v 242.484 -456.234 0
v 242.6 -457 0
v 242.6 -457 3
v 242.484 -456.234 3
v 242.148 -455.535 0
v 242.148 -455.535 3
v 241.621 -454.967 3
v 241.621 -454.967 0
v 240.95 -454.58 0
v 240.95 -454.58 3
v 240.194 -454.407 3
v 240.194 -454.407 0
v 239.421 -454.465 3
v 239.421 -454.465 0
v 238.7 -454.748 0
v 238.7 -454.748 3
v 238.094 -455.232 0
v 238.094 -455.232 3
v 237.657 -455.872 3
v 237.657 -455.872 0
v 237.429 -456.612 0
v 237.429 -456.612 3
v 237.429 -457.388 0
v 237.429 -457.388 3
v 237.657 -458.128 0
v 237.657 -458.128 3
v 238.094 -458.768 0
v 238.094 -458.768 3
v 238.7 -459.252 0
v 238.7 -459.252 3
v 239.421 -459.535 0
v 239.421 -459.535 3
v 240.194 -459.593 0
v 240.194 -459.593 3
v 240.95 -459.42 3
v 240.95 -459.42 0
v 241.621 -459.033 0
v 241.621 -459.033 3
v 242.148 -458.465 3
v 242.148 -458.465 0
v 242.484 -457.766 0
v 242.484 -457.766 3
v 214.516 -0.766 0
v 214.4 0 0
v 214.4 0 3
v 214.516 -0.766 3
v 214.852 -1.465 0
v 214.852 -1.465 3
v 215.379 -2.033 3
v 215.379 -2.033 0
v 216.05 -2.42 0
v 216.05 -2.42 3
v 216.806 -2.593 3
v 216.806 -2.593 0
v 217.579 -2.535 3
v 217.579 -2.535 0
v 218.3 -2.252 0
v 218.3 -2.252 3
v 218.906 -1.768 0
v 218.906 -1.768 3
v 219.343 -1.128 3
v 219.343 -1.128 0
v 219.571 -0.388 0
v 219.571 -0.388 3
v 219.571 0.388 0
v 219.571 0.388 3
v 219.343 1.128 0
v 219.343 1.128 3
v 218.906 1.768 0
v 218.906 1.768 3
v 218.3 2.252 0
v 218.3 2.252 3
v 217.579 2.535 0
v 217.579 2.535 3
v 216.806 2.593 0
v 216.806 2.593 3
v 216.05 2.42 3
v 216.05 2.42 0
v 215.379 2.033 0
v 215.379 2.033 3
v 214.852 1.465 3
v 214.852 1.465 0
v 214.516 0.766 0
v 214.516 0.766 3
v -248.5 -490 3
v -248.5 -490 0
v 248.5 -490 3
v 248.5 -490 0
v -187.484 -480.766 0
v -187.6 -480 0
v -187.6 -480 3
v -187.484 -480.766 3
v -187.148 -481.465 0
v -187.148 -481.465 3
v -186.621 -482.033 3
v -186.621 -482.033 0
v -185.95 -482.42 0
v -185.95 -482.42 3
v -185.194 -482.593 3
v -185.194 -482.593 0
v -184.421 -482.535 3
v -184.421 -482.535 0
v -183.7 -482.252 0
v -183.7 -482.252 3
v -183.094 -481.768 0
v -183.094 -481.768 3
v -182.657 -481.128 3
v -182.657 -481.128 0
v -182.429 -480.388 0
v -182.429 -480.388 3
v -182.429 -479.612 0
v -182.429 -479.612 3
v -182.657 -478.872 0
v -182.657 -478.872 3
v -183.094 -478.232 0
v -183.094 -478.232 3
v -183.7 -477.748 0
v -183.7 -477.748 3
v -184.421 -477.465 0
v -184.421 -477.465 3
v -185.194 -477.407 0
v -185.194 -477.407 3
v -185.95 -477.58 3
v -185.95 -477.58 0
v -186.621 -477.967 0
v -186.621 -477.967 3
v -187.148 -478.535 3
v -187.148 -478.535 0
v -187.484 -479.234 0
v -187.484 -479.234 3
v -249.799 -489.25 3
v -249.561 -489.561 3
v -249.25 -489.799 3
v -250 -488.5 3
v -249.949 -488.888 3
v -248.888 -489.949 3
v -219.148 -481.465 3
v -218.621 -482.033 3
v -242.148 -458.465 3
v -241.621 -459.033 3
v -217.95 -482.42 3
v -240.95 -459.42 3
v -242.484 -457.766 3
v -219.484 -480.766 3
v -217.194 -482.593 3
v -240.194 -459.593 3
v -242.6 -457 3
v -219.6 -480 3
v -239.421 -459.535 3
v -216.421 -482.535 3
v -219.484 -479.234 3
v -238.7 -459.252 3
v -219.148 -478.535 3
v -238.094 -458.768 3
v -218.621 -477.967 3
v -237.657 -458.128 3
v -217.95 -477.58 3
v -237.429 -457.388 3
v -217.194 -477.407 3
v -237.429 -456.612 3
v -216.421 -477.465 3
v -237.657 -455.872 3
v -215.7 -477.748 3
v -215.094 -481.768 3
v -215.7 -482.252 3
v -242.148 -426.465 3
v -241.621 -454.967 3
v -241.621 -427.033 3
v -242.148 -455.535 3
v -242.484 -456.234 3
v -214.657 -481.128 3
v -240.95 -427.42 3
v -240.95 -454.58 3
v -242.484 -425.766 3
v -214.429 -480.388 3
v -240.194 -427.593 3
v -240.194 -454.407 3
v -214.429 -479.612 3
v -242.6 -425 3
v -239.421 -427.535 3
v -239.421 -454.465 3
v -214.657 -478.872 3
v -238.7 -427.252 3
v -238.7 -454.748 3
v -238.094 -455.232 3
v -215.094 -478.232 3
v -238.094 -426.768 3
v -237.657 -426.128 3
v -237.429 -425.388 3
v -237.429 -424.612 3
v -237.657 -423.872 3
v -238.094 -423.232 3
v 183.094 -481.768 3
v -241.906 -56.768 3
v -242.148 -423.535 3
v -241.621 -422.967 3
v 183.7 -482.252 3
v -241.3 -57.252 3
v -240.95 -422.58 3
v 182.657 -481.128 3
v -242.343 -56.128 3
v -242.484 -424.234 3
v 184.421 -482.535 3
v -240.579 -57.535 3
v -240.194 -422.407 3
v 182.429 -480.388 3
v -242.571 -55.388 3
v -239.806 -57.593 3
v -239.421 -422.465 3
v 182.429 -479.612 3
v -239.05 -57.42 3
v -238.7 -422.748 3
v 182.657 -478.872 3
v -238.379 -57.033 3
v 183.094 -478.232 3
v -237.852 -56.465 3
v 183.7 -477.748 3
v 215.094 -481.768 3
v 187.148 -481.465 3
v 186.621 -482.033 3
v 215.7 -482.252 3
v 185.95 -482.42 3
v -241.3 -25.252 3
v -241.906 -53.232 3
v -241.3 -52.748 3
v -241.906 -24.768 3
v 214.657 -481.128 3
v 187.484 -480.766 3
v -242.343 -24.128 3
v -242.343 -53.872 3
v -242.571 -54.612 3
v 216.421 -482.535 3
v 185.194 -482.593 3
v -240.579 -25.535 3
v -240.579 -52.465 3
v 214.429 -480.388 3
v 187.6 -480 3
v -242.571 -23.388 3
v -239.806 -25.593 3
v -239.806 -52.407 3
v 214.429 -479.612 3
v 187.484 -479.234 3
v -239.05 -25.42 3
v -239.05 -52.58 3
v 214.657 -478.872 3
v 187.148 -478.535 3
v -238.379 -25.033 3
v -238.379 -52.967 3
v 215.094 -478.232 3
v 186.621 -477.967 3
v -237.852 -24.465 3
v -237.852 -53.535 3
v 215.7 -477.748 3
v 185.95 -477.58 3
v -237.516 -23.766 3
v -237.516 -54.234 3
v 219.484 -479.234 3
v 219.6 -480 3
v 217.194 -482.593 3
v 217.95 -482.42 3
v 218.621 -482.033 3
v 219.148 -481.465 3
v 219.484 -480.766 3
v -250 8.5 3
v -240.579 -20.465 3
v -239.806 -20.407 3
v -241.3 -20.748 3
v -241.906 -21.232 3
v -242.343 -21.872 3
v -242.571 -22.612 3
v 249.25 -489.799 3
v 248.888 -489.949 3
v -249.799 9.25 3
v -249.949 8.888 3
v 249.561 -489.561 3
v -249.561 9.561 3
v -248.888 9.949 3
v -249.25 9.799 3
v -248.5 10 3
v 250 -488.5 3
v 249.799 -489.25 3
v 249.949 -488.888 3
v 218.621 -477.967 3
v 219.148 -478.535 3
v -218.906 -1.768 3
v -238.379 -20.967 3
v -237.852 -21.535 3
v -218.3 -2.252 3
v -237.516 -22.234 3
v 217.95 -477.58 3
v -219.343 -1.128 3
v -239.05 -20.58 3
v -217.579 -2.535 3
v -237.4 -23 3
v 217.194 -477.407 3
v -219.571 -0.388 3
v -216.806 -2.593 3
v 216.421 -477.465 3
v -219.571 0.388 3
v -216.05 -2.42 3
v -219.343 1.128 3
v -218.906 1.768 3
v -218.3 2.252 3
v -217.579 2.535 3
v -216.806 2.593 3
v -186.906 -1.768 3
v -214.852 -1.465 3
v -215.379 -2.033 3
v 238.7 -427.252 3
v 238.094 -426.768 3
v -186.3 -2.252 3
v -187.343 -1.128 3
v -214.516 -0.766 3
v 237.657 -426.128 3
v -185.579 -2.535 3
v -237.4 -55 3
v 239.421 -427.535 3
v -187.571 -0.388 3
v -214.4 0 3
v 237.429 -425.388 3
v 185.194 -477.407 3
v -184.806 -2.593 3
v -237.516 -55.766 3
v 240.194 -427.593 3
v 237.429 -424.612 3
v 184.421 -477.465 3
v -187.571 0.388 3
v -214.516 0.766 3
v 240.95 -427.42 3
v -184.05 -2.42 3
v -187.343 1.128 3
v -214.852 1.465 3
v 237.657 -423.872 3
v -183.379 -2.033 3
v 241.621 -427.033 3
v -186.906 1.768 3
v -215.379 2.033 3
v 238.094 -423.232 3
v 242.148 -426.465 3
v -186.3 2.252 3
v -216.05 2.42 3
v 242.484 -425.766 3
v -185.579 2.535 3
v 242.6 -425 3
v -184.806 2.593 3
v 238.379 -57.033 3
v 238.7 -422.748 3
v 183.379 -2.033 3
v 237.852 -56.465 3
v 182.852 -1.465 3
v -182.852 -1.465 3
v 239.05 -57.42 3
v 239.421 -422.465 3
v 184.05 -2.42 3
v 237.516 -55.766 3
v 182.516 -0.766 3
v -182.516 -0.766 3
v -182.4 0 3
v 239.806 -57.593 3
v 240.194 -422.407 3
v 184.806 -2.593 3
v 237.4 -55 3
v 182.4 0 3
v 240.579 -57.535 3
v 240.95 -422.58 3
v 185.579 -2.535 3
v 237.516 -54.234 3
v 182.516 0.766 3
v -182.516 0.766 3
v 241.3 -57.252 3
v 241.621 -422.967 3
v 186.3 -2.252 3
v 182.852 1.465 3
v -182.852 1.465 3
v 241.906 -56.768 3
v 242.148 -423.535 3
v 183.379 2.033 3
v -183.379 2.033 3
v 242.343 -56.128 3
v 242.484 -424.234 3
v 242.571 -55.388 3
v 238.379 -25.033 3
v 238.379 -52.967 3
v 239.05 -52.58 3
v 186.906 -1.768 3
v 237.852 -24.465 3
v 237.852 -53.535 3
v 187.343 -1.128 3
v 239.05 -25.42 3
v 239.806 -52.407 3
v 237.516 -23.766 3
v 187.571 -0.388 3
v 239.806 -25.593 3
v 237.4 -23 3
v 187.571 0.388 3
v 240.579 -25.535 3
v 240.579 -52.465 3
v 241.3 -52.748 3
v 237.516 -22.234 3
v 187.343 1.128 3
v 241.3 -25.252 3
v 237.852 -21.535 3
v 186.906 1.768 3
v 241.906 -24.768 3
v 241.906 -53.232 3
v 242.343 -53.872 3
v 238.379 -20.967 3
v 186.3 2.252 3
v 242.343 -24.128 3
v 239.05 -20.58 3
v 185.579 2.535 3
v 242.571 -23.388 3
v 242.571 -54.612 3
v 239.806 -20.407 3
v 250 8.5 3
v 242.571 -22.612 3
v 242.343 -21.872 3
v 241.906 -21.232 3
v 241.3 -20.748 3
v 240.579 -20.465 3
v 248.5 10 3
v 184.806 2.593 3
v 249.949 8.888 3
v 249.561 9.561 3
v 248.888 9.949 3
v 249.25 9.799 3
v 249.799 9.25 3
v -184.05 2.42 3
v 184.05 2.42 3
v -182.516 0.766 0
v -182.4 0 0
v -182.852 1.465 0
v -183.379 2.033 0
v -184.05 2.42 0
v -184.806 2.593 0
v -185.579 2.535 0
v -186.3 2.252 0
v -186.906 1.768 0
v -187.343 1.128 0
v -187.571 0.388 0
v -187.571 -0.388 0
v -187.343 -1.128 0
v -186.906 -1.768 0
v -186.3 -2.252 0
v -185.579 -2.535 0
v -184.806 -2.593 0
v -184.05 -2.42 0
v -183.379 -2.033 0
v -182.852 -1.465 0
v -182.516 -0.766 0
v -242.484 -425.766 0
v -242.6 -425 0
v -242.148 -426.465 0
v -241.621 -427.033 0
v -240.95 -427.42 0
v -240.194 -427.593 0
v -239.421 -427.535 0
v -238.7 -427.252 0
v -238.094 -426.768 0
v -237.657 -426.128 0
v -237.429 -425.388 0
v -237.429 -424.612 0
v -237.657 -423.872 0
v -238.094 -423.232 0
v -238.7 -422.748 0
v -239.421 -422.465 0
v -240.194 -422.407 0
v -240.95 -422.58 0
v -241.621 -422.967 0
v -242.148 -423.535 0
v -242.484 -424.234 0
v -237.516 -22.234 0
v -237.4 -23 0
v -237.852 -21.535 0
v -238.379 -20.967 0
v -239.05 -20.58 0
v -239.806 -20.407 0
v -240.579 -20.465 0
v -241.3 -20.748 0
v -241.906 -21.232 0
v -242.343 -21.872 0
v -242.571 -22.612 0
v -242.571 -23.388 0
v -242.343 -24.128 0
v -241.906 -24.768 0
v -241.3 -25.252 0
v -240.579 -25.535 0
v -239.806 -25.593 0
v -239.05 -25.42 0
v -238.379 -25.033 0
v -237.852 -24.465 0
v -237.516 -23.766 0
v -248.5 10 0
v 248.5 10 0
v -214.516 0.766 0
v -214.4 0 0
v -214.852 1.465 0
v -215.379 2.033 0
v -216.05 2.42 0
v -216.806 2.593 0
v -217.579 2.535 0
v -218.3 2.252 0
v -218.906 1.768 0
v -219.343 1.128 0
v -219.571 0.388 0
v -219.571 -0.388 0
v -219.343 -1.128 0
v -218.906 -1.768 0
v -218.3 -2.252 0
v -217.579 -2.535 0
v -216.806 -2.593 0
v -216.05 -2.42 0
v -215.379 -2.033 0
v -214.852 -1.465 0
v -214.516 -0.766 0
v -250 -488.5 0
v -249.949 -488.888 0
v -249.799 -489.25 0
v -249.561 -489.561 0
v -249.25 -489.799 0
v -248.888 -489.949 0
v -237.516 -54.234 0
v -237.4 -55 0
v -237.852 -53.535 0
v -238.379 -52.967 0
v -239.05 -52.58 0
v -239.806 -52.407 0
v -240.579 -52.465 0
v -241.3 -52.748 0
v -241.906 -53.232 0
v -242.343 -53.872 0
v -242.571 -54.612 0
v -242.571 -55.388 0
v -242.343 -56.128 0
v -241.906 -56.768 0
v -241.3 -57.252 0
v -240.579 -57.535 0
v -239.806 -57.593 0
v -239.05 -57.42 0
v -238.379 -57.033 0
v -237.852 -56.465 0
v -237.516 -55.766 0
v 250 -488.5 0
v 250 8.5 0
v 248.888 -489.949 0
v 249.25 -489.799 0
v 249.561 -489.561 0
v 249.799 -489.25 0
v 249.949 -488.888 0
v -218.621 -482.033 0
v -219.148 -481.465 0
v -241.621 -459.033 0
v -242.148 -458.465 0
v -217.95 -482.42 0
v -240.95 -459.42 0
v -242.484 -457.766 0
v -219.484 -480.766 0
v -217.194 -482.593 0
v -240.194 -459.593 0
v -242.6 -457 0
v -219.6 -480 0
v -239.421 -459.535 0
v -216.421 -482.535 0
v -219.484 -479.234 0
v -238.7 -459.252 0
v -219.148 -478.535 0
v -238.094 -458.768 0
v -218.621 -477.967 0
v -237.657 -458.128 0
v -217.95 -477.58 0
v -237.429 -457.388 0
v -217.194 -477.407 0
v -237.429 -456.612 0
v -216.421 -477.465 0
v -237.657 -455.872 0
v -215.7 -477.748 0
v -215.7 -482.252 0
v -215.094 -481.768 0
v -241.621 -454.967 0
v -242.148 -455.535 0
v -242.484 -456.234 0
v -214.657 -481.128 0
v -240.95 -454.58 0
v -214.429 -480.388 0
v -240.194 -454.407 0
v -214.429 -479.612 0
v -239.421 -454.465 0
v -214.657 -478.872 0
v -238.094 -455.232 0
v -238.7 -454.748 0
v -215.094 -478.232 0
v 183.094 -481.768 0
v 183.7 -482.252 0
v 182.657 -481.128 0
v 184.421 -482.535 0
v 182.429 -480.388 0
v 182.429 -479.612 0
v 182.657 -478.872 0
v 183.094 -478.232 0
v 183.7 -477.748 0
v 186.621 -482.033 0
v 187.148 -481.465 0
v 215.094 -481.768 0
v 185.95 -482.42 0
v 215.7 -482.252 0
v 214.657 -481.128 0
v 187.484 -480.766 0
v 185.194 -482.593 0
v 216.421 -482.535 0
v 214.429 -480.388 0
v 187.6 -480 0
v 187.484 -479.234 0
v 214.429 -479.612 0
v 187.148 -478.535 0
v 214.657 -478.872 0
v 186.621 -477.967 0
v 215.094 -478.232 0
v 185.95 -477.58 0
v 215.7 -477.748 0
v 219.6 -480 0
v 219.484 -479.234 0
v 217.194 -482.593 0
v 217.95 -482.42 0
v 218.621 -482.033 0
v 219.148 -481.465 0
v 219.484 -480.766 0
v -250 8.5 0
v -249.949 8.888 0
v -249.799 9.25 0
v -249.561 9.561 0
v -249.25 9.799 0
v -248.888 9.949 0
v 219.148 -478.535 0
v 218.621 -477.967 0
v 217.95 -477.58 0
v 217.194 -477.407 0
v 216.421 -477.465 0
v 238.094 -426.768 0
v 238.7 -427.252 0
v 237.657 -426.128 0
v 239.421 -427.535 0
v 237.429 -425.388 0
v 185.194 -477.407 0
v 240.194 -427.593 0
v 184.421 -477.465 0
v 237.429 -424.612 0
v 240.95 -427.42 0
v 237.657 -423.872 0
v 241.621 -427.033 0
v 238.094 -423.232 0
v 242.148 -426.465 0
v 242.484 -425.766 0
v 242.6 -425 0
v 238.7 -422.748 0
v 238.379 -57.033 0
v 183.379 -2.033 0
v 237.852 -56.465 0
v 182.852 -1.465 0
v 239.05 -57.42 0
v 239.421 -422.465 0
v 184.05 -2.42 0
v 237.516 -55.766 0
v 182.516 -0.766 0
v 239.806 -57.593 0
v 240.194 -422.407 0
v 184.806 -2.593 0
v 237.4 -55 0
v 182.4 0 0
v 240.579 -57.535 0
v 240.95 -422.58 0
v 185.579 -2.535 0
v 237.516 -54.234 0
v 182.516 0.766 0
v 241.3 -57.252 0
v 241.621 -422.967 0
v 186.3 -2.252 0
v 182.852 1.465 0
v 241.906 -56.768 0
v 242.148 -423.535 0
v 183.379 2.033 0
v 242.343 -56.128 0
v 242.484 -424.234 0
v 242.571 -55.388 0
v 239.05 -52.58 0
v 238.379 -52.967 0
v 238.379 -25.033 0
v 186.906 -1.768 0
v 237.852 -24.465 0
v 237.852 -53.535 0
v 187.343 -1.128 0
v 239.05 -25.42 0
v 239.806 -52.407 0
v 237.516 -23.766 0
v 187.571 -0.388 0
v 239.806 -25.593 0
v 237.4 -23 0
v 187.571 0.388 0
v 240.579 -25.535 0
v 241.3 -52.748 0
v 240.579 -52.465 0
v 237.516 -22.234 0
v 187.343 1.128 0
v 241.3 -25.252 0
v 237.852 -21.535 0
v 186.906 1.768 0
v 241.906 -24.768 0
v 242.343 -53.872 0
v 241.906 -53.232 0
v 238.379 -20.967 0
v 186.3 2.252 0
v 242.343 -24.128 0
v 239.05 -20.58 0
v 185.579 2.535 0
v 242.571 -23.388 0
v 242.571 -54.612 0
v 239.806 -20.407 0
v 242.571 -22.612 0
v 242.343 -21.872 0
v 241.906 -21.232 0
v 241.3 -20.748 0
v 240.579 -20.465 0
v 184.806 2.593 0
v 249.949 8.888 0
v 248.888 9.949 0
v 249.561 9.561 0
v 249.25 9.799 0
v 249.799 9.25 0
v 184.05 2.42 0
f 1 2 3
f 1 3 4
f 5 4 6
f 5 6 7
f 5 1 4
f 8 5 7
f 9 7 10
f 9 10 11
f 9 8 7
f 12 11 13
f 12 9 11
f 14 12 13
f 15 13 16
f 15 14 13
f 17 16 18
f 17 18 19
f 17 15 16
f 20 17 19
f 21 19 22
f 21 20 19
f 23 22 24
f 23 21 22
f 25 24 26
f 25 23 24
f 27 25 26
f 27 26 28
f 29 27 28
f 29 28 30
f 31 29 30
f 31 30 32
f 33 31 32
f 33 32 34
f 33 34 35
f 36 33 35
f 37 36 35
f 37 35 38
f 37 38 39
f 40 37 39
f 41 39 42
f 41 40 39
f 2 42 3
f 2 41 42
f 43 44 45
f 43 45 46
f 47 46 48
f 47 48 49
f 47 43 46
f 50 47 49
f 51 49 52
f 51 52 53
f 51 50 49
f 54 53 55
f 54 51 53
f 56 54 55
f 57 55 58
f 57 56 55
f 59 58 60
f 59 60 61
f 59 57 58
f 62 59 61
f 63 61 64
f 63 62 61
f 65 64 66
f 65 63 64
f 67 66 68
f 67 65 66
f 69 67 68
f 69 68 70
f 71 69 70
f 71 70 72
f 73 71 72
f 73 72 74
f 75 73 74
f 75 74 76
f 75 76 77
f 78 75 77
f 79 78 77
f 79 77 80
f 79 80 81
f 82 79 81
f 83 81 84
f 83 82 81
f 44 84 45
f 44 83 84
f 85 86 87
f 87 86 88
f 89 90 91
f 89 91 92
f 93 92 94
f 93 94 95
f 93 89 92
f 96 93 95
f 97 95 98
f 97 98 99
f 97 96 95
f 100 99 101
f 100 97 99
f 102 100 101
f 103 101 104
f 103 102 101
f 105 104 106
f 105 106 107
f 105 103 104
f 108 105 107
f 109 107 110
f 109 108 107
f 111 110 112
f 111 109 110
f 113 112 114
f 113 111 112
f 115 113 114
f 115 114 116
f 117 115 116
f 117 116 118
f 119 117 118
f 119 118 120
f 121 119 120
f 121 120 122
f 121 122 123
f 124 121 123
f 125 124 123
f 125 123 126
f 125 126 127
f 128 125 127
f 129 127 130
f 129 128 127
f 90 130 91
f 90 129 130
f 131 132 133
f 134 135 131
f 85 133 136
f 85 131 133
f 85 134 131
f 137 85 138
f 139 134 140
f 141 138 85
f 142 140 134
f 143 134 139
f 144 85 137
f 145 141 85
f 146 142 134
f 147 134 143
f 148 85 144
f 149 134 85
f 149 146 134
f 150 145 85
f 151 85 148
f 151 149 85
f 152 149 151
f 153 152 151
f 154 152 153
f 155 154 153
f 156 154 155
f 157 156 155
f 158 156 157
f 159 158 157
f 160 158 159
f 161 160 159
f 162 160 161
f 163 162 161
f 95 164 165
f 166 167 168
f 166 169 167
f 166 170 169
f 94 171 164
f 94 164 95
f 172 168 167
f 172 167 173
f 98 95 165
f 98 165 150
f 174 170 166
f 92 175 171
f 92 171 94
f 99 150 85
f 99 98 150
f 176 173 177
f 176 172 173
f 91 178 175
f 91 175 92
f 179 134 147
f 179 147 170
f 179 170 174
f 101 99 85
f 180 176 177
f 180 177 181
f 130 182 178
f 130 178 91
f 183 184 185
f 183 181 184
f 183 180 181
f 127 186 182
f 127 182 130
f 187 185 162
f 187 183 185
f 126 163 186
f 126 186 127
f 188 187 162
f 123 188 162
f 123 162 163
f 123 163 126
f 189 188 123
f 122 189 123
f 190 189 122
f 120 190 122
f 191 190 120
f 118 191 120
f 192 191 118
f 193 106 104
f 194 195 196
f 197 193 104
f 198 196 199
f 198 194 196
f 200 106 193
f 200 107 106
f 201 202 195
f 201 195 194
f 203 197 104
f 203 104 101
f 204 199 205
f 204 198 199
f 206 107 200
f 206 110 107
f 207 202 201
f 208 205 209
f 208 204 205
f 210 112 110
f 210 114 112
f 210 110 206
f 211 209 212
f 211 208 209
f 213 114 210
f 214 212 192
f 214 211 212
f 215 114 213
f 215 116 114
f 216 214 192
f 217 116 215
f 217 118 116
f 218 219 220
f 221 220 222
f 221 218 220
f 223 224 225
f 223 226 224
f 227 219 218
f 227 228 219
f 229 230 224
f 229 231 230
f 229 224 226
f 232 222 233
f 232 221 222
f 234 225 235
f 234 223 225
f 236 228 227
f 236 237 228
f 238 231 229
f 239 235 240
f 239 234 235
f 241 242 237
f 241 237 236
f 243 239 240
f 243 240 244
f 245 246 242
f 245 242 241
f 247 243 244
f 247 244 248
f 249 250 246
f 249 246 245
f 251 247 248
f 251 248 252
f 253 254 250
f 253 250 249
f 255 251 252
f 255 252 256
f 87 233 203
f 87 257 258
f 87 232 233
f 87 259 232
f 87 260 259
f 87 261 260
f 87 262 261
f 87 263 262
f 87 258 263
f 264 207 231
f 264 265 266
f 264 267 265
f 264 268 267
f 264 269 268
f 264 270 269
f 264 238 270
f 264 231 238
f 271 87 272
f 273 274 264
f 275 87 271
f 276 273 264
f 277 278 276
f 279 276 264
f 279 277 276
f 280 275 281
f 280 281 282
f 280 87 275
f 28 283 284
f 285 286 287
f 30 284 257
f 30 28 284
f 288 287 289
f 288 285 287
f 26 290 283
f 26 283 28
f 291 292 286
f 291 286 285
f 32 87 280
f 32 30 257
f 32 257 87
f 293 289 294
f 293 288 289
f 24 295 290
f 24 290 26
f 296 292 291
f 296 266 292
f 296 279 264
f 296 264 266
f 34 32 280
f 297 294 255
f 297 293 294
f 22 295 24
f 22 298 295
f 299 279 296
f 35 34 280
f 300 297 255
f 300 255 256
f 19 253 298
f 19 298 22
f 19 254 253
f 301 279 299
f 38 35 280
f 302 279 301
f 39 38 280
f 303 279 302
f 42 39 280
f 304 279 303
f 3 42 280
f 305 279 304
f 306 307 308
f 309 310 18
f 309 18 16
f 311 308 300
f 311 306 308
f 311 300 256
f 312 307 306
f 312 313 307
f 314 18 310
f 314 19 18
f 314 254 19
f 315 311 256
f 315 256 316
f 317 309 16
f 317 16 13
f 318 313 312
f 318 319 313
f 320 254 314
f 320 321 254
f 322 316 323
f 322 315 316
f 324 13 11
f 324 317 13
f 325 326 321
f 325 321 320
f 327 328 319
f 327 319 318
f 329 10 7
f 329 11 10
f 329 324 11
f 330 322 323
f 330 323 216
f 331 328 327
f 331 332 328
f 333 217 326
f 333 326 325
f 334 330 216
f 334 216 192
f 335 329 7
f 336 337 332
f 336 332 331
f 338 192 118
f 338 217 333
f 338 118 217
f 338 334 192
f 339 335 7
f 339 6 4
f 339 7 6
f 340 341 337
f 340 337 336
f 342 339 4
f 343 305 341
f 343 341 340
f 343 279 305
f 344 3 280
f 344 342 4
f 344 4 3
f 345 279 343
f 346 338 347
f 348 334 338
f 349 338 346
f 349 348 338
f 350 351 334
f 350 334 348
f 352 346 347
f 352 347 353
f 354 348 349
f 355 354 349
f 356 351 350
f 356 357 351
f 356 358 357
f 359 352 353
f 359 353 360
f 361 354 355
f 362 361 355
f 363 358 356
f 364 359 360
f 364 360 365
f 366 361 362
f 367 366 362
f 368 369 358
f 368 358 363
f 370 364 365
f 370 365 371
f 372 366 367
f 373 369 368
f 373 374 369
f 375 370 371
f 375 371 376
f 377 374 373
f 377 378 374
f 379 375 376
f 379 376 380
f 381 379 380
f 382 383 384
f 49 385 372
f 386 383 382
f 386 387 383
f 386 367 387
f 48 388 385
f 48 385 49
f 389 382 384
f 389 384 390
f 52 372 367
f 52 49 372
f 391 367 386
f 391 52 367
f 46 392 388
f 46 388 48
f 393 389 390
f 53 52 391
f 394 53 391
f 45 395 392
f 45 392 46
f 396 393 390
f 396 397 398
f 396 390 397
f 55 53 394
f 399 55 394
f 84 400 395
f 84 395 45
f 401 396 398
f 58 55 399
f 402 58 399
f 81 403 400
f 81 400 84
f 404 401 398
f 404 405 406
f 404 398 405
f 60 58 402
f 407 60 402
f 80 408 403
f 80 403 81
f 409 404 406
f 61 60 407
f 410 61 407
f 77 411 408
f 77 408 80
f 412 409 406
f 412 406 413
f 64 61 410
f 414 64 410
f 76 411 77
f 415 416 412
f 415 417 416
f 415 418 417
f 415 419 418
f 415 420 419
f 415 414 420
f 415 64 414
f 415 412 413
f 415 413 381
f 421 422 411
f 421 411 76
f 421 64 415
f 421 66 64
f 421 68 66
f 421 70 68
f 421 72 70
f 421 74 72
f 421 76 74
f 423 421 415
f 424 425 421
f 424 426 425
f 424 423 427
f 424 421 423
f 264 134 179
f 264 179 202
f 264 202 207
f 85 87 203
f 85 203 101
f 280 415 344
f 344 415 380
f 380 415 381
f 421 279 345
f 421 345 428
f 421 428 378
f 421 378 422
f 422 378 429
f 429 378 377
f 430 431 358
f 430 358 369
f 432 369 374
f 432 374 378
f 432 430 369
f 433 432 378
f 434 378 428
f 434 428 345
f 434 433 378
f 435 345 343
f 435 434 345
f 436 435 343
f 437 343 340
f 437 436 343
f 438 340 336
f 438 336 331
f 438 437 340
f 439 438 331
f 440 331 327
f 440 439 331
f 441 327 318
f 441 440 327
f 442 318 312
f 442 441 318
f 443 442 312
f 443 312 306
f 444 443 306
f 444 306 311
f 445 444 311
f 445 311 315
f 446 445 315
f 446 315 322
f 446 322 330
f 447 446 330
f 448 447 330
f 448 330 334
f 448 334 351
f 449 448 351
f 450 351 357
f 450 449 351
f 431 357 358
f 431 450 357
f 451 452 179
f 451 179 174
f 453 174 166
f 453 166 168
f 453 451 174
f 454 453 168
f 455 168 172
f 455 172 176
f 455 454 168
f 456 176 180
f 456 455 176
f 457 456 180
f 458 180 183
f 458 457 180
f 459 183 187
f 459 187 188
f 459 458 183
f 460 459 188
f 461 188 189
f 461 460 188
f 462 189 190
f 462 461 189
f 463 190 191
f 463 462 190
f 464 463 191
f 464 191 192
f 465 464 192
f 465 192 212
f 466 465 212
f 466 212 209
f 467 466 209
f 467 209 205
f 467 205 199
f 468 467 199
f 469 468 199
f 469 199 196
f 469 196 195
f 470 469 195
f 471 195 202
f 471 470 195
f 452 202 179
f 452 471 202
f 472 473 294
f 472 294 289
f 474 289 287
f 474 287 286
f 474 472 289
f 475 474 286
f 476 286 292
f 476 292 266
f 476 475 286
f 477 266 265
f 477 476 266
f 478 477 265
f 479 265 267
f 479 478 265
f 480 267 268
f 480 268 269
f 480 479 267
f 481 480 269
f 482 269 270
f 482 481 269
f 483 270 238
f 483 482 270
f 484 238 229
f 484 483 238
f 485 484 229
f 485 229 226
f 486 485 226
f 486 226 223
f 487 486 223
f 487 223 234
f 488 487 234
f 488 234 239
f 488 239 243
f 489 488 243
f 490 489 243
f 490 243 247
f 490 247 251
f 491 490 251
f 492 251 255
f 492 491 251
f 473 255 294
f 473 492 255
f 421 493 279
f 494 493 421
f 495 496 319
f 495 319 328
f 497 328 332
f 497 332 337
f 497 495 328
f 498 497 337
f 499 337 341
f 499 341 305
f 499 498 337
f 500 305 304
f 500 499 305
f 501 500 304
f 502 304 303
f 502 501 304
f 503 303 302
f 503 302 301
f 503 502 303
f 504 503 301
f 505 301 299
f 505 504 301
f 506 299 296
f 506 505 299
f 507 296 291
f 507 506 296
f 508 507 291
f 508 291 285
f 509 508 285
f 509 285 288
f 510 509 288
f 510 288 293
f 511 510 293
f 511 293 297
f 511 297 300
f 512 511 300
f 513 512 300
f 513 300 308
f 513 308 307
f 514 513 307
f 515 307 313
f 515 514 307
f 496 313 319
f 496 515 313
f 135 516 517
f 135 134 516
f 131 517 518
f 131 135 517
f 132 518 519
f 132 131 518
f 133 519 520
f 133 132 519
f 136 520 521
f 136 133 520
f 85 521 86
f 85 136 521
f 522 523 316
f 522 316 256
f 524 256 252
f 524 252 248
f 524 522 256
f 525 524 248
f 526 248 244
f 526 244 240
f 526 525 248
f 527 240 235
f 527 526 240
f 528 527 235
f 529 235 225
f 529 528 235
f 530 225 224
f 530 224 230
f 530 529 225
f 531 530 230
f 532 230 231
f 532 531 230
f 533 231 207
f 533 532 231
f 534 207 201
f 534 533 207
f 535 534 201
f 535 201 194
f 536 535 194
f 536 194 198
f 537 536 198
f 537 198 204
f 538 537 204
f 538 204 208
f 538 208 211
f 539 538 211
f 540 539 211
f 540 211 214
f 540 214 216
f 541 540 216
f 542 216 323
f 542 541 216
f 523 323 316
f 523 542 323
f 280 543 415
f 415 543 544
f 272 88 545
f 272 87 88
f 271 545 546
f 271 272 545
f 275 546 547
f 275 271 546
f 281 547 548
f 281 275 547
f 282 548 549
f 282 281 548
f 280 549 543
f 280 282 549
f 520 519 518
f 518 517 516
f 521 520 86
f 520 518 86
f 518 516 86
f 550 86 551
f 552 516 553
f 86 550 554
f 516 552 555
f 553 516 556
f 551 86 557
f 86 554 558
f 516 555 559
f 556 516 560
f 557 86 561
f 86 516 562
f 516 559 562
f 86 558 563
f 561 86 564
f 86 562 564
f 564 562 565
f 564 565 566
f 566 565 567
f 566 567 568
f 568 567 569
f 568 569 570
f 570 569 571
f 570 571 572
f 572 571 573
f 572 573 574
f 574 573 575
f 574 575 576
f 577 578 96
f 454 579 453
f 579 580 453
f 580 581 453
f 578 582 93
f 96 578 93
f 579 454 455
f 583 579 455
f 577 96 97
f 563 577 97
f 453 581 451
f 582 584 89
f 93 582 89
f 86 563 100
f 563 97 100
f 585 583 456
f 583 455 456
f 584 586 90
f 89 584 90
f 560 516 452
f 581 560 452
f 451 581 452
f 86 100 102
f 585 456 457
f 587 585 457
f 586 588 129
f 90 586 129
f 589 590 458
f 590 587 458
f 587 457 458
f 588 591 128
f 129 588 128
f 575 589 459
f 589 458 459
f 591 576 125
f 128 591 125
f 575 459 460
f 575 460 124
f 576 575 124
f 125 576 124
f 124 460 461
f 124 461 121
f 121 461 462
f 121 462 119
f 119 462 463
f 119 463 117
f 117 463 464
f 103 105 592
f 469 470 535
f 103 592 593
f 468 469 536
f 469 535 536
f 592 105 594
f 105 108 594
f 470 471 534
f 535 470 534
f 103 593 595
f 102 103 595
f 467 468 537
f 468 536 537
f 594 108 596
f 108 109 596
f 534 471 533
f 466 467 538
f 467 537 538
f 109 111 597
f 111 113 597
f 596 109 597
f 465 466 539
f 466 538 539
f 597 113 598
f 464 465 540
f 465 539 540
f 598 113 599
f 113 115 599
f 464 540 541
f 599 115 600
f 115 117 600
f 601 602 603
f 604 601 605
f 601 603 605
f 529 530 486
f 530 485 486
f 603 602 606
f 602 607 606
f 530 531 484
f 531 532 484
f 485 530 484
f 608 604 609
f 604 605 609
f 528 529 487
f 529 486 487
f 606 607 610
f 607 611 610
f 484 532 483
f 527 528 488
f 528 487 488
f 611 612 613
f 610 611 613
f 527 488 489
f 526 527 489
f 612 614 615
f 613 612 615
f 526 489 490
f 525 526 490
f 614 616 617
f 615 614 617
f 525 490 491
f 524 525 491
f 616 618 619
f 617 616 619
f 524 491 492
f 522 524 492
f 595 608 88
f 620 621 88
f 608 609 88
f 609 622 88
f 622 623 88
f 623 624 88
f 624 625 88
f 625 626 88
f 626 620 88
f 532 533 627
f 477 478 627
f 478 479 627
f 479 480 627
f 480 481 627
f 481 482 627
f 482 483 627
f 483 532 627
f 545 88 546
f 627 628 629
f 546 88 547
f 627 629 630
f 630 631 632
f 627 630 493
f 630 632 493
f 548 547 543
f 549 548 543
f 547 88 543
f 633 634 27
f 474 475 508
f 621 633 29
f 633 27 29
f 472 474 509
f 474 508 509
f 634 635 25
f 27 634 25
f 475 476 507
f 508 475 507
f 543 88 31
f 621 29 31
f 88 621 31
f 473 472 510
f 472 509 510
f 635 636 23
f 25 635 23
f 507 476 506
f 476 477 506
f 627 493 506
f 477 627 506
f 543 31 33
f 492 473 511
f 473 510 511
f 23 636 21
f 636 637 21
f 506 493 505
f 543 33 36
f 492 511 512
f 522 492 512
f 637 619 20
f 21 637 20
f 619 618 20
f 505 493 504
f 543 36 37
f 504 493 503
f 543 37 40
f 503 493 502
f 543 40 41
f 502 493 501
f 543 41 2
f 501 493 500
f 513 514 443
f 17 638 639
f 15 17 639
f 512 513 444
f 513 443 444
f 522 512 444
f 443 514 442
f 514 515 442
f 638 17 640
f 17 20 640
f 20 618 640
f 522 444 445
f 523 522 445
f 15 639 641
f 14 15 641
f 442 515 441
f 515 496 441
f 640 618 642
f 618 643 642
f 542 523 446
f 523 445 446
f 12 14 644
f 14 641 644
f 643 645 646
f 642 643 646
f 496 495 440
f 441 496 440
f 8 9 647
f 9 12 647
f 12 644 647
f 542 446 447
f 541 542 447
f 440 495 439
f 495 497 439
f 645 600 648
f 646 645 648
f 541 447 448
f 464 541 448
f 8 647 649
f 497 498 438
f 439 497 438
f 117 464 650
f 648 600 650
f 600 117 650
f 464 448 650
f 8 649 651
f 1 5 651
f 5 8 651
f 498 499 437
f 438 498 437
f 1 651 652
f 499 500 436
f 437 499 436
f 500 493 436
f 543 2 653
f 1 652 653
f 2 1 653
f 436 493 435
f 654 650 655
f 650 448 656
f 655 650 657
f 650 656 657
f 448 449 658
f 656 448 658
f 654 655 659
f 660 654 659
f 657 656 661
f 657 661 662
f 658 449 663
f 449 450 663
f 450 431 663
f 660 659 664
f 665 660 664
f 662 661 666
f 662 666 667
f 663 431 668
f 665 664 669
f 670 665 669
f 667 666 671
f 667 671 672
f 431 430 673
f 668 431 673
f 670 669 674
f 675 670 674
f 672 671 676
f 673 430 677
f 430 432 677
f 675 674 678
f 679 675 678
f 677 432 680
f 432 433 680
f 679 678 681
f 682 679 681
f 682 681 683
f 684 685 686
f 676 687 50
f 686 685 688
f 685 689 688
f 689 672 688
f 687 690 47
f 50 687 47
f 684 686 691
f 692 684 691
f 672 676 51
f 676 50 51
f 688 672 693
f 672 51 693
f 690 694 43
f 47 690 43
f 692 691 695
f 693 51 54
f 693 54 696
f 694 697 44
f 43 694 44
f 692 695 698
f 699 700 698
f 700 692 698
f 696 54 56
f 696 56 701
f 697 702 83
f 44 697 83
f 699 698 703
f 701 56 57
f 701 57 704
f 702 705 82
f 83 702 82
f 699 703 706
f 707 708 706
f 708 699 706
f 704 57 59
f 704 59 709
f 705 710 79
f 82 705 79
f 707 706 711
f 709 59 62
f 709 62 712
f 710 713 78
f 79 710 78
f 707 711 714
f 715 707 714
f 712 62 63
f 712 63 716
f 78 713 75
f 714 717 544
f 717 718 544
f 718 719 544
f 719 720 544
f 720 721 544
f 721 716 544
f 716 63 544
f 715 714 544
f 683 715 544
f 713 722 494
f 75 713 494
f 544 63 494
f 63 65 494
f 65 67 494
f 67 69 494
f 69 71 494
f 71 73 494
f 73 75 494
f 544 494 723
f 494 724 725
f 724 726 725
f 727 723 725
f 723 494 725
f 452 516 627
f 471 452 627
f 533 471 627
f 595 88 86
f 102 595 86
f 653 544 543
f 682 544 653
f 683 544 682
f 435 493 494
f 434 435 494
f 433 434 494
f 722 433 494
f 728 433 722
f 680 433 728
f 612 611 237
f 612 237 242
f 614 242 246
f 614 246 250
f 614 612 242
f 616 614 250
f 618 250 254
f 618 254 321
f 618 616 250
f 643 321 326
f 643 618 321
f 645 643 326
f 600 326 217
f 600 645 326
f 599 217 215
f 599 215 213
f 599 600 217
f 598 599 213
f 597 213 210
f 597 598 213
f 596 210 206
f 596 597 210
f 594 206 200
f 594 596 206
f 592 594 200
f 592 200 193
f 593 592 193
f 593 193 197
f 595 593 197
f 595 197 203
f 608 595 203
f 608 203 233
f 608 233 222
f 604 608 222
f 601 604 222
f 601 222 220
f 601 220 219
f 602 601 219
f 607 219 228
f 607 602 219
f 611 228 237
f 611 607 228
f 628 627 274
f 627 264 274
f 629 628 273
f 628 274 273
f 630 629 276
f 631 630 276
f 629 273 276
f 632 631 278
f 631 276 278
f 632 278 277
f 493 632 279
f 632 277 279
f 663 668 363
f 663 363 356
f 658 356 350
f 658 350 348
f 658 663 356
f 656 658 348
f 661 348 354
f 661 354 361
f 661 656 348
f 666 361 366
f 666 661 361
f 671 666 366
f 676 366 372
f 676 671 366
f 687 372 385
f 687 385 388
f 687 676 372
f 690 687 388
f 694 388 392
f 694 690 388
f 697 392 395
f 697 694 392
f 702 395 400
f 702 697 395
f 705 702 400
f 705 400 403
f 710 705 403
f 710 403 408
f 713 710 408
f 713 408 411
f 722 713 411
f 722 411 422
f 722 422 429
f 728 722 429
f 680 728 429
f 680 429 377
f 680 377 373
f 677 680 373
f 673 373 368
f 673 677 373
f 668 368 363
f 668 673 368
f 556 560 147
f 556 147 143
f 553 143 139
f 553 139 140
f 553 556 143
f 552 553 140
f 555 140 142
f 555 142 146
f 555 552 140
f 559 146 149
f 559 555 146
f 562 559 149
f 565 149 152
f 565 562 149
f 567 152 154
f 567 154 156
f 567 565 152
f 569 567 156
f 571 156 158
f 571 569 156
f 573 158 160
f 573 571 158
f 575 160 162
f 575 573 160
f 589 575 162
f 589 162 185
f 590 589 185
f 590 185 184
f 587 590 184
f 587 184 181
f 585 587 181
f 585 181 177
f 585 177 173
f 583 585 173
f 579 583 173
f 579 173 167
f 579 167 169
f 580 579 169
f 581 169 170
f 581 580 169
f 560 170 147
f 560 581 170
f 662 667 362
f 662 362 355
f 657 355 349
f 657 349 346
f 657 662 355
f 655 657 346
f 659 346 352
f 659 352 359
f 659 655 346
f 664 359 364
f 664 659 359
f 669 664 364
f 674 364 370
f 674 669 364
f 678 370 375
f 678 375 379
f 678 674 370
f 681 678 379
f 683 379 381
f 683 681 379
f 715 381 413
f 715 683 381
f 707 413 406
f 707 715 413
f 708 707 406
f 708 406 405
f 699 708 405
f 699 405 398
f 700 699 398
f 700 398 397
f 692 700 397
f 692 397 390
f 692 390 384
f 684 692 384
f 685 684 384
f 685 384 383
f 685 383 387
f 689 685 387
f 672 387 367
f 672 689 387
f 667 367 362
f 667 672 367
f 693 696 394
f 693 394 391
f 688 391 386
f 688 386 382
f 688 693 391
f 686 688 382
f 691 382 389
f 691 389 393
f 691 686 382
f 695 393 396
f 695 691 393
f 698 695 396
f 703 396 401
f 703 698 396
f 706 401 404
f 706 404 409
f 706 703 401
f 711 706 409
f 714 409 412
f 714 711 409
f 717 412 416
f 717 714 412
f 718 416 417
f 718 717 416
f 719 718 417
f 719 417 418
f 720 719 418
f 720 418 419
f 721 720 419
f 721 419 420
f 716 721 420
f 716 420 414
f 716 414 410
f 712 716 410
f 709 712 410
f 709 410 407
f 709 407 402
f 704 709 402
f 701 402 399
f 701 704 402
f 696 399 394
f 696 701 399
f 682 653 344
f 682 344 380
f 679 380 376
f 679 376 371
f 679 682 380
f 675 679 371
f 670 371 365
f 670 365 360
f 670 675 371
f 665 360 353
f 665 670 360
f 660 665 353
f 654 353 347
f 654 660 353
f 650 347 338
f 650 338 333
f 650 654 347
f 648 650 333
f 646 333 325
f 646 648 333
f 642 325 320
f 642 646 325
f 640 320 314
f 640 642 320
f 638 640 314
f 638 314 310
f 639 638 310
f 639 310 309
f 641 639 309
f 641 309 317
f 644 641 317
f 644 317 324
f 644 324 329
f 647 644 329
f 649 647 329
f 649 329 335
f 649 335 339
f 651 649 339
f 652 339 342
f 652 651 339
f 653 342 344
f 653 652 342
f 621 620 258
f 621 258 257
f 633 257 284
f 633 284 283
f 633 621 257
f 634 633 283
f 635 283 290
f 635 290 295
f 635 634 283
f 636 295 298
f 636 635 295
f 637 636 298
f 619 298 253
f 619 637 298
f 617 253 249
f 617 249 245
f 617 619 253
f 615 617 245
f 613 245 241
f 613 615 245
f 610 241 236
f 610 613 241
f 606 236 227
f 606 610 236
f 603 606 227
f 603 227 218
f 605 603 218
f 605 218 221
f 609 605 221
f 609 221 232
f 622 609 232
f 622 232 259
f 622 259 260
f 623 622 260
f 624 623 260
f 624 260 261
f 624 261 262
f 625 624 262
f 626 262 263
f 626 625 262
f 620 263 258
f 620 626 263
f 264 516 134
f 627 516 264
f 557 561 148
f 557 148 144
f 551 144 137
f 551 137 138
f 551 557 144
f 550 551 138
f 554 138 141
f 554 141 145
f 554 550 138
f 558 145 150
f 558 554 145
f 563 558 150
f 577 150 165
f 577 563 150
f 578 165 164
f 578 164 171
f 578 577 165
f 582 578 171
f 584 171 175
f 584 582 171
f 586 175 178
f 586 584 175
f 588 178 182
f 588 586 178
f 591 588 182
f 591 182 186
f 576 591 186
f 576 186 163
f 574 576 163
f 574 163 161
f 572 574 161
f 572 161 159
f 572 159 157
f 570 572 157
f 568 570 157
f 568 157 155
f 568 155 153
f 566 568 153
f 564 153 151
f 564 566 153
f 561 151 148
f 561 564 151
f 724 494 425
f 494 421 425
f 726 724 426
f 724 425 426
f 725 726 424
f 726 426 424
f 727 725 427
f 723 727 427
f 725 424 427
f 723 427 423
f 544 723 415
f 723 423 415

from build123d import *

# Parameters (mm, degrees)
SKETCH1_W           = 500
SKETCH1_H           = 500
SKETCH1_R           = 2.6
BOSS_EXTRUDE1_DEPTH = 3
FILLET1_R           = 1.5


with BuildPart() as part:
    # Sketch1 → Boss-Extrude1 (new body)
    with BuildSketch(Plane.XY):
        with Locations((0, -240)):
            Rectangle(SKETCH1_W, SKETCH1_H)
        with Locations((-185, 0)):
            Circle(SKETCH1_R, mode=Mode.SUBTRACT)
        with Locations((-217, 0)):
            Circle(SKETCH1_R, mode=Mode.SUBTRACT)
        with Locations((-240, -23)):
            Circle(SKETCH1_R, mode=Mode.SUBTRACT)
        with Locations((-240, -55)):
            Circle(SKETCH1_R, mode=Mode.SUBTRACT)
        with Locations(Location((-240, -425, 0), (0, 0, 180))):
            Circle(SKETCH1_R, mode=Mode.SUBTRACT)
        with Locations(Location((-240, -457, 0), (0, 0, 180))):
            Circle(SKETCH1_R, mode=Mode.SUBTRACT)
        with Locations(Location((-217, -480, 0), (0, 0, 180))):
            Circle(SKETCH1_R, mode=Mode.SUBTRACT)
        with Locations(Location((-185, -480, 0), (0, 0, 180))):
            Circle(SKETCH1_R, mode=Mode.SUBTRACT)
        with Locations((185, -480)):
            Circle(SKETCH1_R, mode=Mode.SUBTRACT)
        with Locations((217, -480)):
            Circle(SKETCH1_R, mode=Mode.SUBTRACT)
        with Locations((240, -457)):
            Circle(SKETCH1_R, mode=Mode.SUBTRACT)
        with Locations((240, -425)):
            Circle(SKETCH1_R, mode=Mode.SUBTRACT)
        with Locations(Location((240, -55, 0), (0, 0, 180))):
            Circle(SKETCH1_R, mode=Mode.SUBTRACT)
        with Locations(Location((240, -23, 0), (0, 0, 180))):
            Circle(SKETCH1_R, mode=Mode.SUBTRACT)
        with Locations(Location((217, 0, 0), (0, 0, 180))):
            Circle(SKETCH1_R, mode=Mode.SUBTRACT)
        with Locations(Location((185, 0, 0), (0, 0, 180))):
            Circle(SKETCH1_R, mode=Mode.SUBTRACT)
    extrude(amount=BOSS_EXTRUDE1_DEPTH)

    # Fillet1
    fillet1_edges = [part.edges().sort_by_distance(p)[0] for p in [
        (-250, 10, 1.5),
        (250, 10, 1.5),
        (250, -490, 1.5),
        (-250, -490, 1.5),
    ]]
    fillet(fillet1_edges, radius=FILLET1_R)


solid = part.part
